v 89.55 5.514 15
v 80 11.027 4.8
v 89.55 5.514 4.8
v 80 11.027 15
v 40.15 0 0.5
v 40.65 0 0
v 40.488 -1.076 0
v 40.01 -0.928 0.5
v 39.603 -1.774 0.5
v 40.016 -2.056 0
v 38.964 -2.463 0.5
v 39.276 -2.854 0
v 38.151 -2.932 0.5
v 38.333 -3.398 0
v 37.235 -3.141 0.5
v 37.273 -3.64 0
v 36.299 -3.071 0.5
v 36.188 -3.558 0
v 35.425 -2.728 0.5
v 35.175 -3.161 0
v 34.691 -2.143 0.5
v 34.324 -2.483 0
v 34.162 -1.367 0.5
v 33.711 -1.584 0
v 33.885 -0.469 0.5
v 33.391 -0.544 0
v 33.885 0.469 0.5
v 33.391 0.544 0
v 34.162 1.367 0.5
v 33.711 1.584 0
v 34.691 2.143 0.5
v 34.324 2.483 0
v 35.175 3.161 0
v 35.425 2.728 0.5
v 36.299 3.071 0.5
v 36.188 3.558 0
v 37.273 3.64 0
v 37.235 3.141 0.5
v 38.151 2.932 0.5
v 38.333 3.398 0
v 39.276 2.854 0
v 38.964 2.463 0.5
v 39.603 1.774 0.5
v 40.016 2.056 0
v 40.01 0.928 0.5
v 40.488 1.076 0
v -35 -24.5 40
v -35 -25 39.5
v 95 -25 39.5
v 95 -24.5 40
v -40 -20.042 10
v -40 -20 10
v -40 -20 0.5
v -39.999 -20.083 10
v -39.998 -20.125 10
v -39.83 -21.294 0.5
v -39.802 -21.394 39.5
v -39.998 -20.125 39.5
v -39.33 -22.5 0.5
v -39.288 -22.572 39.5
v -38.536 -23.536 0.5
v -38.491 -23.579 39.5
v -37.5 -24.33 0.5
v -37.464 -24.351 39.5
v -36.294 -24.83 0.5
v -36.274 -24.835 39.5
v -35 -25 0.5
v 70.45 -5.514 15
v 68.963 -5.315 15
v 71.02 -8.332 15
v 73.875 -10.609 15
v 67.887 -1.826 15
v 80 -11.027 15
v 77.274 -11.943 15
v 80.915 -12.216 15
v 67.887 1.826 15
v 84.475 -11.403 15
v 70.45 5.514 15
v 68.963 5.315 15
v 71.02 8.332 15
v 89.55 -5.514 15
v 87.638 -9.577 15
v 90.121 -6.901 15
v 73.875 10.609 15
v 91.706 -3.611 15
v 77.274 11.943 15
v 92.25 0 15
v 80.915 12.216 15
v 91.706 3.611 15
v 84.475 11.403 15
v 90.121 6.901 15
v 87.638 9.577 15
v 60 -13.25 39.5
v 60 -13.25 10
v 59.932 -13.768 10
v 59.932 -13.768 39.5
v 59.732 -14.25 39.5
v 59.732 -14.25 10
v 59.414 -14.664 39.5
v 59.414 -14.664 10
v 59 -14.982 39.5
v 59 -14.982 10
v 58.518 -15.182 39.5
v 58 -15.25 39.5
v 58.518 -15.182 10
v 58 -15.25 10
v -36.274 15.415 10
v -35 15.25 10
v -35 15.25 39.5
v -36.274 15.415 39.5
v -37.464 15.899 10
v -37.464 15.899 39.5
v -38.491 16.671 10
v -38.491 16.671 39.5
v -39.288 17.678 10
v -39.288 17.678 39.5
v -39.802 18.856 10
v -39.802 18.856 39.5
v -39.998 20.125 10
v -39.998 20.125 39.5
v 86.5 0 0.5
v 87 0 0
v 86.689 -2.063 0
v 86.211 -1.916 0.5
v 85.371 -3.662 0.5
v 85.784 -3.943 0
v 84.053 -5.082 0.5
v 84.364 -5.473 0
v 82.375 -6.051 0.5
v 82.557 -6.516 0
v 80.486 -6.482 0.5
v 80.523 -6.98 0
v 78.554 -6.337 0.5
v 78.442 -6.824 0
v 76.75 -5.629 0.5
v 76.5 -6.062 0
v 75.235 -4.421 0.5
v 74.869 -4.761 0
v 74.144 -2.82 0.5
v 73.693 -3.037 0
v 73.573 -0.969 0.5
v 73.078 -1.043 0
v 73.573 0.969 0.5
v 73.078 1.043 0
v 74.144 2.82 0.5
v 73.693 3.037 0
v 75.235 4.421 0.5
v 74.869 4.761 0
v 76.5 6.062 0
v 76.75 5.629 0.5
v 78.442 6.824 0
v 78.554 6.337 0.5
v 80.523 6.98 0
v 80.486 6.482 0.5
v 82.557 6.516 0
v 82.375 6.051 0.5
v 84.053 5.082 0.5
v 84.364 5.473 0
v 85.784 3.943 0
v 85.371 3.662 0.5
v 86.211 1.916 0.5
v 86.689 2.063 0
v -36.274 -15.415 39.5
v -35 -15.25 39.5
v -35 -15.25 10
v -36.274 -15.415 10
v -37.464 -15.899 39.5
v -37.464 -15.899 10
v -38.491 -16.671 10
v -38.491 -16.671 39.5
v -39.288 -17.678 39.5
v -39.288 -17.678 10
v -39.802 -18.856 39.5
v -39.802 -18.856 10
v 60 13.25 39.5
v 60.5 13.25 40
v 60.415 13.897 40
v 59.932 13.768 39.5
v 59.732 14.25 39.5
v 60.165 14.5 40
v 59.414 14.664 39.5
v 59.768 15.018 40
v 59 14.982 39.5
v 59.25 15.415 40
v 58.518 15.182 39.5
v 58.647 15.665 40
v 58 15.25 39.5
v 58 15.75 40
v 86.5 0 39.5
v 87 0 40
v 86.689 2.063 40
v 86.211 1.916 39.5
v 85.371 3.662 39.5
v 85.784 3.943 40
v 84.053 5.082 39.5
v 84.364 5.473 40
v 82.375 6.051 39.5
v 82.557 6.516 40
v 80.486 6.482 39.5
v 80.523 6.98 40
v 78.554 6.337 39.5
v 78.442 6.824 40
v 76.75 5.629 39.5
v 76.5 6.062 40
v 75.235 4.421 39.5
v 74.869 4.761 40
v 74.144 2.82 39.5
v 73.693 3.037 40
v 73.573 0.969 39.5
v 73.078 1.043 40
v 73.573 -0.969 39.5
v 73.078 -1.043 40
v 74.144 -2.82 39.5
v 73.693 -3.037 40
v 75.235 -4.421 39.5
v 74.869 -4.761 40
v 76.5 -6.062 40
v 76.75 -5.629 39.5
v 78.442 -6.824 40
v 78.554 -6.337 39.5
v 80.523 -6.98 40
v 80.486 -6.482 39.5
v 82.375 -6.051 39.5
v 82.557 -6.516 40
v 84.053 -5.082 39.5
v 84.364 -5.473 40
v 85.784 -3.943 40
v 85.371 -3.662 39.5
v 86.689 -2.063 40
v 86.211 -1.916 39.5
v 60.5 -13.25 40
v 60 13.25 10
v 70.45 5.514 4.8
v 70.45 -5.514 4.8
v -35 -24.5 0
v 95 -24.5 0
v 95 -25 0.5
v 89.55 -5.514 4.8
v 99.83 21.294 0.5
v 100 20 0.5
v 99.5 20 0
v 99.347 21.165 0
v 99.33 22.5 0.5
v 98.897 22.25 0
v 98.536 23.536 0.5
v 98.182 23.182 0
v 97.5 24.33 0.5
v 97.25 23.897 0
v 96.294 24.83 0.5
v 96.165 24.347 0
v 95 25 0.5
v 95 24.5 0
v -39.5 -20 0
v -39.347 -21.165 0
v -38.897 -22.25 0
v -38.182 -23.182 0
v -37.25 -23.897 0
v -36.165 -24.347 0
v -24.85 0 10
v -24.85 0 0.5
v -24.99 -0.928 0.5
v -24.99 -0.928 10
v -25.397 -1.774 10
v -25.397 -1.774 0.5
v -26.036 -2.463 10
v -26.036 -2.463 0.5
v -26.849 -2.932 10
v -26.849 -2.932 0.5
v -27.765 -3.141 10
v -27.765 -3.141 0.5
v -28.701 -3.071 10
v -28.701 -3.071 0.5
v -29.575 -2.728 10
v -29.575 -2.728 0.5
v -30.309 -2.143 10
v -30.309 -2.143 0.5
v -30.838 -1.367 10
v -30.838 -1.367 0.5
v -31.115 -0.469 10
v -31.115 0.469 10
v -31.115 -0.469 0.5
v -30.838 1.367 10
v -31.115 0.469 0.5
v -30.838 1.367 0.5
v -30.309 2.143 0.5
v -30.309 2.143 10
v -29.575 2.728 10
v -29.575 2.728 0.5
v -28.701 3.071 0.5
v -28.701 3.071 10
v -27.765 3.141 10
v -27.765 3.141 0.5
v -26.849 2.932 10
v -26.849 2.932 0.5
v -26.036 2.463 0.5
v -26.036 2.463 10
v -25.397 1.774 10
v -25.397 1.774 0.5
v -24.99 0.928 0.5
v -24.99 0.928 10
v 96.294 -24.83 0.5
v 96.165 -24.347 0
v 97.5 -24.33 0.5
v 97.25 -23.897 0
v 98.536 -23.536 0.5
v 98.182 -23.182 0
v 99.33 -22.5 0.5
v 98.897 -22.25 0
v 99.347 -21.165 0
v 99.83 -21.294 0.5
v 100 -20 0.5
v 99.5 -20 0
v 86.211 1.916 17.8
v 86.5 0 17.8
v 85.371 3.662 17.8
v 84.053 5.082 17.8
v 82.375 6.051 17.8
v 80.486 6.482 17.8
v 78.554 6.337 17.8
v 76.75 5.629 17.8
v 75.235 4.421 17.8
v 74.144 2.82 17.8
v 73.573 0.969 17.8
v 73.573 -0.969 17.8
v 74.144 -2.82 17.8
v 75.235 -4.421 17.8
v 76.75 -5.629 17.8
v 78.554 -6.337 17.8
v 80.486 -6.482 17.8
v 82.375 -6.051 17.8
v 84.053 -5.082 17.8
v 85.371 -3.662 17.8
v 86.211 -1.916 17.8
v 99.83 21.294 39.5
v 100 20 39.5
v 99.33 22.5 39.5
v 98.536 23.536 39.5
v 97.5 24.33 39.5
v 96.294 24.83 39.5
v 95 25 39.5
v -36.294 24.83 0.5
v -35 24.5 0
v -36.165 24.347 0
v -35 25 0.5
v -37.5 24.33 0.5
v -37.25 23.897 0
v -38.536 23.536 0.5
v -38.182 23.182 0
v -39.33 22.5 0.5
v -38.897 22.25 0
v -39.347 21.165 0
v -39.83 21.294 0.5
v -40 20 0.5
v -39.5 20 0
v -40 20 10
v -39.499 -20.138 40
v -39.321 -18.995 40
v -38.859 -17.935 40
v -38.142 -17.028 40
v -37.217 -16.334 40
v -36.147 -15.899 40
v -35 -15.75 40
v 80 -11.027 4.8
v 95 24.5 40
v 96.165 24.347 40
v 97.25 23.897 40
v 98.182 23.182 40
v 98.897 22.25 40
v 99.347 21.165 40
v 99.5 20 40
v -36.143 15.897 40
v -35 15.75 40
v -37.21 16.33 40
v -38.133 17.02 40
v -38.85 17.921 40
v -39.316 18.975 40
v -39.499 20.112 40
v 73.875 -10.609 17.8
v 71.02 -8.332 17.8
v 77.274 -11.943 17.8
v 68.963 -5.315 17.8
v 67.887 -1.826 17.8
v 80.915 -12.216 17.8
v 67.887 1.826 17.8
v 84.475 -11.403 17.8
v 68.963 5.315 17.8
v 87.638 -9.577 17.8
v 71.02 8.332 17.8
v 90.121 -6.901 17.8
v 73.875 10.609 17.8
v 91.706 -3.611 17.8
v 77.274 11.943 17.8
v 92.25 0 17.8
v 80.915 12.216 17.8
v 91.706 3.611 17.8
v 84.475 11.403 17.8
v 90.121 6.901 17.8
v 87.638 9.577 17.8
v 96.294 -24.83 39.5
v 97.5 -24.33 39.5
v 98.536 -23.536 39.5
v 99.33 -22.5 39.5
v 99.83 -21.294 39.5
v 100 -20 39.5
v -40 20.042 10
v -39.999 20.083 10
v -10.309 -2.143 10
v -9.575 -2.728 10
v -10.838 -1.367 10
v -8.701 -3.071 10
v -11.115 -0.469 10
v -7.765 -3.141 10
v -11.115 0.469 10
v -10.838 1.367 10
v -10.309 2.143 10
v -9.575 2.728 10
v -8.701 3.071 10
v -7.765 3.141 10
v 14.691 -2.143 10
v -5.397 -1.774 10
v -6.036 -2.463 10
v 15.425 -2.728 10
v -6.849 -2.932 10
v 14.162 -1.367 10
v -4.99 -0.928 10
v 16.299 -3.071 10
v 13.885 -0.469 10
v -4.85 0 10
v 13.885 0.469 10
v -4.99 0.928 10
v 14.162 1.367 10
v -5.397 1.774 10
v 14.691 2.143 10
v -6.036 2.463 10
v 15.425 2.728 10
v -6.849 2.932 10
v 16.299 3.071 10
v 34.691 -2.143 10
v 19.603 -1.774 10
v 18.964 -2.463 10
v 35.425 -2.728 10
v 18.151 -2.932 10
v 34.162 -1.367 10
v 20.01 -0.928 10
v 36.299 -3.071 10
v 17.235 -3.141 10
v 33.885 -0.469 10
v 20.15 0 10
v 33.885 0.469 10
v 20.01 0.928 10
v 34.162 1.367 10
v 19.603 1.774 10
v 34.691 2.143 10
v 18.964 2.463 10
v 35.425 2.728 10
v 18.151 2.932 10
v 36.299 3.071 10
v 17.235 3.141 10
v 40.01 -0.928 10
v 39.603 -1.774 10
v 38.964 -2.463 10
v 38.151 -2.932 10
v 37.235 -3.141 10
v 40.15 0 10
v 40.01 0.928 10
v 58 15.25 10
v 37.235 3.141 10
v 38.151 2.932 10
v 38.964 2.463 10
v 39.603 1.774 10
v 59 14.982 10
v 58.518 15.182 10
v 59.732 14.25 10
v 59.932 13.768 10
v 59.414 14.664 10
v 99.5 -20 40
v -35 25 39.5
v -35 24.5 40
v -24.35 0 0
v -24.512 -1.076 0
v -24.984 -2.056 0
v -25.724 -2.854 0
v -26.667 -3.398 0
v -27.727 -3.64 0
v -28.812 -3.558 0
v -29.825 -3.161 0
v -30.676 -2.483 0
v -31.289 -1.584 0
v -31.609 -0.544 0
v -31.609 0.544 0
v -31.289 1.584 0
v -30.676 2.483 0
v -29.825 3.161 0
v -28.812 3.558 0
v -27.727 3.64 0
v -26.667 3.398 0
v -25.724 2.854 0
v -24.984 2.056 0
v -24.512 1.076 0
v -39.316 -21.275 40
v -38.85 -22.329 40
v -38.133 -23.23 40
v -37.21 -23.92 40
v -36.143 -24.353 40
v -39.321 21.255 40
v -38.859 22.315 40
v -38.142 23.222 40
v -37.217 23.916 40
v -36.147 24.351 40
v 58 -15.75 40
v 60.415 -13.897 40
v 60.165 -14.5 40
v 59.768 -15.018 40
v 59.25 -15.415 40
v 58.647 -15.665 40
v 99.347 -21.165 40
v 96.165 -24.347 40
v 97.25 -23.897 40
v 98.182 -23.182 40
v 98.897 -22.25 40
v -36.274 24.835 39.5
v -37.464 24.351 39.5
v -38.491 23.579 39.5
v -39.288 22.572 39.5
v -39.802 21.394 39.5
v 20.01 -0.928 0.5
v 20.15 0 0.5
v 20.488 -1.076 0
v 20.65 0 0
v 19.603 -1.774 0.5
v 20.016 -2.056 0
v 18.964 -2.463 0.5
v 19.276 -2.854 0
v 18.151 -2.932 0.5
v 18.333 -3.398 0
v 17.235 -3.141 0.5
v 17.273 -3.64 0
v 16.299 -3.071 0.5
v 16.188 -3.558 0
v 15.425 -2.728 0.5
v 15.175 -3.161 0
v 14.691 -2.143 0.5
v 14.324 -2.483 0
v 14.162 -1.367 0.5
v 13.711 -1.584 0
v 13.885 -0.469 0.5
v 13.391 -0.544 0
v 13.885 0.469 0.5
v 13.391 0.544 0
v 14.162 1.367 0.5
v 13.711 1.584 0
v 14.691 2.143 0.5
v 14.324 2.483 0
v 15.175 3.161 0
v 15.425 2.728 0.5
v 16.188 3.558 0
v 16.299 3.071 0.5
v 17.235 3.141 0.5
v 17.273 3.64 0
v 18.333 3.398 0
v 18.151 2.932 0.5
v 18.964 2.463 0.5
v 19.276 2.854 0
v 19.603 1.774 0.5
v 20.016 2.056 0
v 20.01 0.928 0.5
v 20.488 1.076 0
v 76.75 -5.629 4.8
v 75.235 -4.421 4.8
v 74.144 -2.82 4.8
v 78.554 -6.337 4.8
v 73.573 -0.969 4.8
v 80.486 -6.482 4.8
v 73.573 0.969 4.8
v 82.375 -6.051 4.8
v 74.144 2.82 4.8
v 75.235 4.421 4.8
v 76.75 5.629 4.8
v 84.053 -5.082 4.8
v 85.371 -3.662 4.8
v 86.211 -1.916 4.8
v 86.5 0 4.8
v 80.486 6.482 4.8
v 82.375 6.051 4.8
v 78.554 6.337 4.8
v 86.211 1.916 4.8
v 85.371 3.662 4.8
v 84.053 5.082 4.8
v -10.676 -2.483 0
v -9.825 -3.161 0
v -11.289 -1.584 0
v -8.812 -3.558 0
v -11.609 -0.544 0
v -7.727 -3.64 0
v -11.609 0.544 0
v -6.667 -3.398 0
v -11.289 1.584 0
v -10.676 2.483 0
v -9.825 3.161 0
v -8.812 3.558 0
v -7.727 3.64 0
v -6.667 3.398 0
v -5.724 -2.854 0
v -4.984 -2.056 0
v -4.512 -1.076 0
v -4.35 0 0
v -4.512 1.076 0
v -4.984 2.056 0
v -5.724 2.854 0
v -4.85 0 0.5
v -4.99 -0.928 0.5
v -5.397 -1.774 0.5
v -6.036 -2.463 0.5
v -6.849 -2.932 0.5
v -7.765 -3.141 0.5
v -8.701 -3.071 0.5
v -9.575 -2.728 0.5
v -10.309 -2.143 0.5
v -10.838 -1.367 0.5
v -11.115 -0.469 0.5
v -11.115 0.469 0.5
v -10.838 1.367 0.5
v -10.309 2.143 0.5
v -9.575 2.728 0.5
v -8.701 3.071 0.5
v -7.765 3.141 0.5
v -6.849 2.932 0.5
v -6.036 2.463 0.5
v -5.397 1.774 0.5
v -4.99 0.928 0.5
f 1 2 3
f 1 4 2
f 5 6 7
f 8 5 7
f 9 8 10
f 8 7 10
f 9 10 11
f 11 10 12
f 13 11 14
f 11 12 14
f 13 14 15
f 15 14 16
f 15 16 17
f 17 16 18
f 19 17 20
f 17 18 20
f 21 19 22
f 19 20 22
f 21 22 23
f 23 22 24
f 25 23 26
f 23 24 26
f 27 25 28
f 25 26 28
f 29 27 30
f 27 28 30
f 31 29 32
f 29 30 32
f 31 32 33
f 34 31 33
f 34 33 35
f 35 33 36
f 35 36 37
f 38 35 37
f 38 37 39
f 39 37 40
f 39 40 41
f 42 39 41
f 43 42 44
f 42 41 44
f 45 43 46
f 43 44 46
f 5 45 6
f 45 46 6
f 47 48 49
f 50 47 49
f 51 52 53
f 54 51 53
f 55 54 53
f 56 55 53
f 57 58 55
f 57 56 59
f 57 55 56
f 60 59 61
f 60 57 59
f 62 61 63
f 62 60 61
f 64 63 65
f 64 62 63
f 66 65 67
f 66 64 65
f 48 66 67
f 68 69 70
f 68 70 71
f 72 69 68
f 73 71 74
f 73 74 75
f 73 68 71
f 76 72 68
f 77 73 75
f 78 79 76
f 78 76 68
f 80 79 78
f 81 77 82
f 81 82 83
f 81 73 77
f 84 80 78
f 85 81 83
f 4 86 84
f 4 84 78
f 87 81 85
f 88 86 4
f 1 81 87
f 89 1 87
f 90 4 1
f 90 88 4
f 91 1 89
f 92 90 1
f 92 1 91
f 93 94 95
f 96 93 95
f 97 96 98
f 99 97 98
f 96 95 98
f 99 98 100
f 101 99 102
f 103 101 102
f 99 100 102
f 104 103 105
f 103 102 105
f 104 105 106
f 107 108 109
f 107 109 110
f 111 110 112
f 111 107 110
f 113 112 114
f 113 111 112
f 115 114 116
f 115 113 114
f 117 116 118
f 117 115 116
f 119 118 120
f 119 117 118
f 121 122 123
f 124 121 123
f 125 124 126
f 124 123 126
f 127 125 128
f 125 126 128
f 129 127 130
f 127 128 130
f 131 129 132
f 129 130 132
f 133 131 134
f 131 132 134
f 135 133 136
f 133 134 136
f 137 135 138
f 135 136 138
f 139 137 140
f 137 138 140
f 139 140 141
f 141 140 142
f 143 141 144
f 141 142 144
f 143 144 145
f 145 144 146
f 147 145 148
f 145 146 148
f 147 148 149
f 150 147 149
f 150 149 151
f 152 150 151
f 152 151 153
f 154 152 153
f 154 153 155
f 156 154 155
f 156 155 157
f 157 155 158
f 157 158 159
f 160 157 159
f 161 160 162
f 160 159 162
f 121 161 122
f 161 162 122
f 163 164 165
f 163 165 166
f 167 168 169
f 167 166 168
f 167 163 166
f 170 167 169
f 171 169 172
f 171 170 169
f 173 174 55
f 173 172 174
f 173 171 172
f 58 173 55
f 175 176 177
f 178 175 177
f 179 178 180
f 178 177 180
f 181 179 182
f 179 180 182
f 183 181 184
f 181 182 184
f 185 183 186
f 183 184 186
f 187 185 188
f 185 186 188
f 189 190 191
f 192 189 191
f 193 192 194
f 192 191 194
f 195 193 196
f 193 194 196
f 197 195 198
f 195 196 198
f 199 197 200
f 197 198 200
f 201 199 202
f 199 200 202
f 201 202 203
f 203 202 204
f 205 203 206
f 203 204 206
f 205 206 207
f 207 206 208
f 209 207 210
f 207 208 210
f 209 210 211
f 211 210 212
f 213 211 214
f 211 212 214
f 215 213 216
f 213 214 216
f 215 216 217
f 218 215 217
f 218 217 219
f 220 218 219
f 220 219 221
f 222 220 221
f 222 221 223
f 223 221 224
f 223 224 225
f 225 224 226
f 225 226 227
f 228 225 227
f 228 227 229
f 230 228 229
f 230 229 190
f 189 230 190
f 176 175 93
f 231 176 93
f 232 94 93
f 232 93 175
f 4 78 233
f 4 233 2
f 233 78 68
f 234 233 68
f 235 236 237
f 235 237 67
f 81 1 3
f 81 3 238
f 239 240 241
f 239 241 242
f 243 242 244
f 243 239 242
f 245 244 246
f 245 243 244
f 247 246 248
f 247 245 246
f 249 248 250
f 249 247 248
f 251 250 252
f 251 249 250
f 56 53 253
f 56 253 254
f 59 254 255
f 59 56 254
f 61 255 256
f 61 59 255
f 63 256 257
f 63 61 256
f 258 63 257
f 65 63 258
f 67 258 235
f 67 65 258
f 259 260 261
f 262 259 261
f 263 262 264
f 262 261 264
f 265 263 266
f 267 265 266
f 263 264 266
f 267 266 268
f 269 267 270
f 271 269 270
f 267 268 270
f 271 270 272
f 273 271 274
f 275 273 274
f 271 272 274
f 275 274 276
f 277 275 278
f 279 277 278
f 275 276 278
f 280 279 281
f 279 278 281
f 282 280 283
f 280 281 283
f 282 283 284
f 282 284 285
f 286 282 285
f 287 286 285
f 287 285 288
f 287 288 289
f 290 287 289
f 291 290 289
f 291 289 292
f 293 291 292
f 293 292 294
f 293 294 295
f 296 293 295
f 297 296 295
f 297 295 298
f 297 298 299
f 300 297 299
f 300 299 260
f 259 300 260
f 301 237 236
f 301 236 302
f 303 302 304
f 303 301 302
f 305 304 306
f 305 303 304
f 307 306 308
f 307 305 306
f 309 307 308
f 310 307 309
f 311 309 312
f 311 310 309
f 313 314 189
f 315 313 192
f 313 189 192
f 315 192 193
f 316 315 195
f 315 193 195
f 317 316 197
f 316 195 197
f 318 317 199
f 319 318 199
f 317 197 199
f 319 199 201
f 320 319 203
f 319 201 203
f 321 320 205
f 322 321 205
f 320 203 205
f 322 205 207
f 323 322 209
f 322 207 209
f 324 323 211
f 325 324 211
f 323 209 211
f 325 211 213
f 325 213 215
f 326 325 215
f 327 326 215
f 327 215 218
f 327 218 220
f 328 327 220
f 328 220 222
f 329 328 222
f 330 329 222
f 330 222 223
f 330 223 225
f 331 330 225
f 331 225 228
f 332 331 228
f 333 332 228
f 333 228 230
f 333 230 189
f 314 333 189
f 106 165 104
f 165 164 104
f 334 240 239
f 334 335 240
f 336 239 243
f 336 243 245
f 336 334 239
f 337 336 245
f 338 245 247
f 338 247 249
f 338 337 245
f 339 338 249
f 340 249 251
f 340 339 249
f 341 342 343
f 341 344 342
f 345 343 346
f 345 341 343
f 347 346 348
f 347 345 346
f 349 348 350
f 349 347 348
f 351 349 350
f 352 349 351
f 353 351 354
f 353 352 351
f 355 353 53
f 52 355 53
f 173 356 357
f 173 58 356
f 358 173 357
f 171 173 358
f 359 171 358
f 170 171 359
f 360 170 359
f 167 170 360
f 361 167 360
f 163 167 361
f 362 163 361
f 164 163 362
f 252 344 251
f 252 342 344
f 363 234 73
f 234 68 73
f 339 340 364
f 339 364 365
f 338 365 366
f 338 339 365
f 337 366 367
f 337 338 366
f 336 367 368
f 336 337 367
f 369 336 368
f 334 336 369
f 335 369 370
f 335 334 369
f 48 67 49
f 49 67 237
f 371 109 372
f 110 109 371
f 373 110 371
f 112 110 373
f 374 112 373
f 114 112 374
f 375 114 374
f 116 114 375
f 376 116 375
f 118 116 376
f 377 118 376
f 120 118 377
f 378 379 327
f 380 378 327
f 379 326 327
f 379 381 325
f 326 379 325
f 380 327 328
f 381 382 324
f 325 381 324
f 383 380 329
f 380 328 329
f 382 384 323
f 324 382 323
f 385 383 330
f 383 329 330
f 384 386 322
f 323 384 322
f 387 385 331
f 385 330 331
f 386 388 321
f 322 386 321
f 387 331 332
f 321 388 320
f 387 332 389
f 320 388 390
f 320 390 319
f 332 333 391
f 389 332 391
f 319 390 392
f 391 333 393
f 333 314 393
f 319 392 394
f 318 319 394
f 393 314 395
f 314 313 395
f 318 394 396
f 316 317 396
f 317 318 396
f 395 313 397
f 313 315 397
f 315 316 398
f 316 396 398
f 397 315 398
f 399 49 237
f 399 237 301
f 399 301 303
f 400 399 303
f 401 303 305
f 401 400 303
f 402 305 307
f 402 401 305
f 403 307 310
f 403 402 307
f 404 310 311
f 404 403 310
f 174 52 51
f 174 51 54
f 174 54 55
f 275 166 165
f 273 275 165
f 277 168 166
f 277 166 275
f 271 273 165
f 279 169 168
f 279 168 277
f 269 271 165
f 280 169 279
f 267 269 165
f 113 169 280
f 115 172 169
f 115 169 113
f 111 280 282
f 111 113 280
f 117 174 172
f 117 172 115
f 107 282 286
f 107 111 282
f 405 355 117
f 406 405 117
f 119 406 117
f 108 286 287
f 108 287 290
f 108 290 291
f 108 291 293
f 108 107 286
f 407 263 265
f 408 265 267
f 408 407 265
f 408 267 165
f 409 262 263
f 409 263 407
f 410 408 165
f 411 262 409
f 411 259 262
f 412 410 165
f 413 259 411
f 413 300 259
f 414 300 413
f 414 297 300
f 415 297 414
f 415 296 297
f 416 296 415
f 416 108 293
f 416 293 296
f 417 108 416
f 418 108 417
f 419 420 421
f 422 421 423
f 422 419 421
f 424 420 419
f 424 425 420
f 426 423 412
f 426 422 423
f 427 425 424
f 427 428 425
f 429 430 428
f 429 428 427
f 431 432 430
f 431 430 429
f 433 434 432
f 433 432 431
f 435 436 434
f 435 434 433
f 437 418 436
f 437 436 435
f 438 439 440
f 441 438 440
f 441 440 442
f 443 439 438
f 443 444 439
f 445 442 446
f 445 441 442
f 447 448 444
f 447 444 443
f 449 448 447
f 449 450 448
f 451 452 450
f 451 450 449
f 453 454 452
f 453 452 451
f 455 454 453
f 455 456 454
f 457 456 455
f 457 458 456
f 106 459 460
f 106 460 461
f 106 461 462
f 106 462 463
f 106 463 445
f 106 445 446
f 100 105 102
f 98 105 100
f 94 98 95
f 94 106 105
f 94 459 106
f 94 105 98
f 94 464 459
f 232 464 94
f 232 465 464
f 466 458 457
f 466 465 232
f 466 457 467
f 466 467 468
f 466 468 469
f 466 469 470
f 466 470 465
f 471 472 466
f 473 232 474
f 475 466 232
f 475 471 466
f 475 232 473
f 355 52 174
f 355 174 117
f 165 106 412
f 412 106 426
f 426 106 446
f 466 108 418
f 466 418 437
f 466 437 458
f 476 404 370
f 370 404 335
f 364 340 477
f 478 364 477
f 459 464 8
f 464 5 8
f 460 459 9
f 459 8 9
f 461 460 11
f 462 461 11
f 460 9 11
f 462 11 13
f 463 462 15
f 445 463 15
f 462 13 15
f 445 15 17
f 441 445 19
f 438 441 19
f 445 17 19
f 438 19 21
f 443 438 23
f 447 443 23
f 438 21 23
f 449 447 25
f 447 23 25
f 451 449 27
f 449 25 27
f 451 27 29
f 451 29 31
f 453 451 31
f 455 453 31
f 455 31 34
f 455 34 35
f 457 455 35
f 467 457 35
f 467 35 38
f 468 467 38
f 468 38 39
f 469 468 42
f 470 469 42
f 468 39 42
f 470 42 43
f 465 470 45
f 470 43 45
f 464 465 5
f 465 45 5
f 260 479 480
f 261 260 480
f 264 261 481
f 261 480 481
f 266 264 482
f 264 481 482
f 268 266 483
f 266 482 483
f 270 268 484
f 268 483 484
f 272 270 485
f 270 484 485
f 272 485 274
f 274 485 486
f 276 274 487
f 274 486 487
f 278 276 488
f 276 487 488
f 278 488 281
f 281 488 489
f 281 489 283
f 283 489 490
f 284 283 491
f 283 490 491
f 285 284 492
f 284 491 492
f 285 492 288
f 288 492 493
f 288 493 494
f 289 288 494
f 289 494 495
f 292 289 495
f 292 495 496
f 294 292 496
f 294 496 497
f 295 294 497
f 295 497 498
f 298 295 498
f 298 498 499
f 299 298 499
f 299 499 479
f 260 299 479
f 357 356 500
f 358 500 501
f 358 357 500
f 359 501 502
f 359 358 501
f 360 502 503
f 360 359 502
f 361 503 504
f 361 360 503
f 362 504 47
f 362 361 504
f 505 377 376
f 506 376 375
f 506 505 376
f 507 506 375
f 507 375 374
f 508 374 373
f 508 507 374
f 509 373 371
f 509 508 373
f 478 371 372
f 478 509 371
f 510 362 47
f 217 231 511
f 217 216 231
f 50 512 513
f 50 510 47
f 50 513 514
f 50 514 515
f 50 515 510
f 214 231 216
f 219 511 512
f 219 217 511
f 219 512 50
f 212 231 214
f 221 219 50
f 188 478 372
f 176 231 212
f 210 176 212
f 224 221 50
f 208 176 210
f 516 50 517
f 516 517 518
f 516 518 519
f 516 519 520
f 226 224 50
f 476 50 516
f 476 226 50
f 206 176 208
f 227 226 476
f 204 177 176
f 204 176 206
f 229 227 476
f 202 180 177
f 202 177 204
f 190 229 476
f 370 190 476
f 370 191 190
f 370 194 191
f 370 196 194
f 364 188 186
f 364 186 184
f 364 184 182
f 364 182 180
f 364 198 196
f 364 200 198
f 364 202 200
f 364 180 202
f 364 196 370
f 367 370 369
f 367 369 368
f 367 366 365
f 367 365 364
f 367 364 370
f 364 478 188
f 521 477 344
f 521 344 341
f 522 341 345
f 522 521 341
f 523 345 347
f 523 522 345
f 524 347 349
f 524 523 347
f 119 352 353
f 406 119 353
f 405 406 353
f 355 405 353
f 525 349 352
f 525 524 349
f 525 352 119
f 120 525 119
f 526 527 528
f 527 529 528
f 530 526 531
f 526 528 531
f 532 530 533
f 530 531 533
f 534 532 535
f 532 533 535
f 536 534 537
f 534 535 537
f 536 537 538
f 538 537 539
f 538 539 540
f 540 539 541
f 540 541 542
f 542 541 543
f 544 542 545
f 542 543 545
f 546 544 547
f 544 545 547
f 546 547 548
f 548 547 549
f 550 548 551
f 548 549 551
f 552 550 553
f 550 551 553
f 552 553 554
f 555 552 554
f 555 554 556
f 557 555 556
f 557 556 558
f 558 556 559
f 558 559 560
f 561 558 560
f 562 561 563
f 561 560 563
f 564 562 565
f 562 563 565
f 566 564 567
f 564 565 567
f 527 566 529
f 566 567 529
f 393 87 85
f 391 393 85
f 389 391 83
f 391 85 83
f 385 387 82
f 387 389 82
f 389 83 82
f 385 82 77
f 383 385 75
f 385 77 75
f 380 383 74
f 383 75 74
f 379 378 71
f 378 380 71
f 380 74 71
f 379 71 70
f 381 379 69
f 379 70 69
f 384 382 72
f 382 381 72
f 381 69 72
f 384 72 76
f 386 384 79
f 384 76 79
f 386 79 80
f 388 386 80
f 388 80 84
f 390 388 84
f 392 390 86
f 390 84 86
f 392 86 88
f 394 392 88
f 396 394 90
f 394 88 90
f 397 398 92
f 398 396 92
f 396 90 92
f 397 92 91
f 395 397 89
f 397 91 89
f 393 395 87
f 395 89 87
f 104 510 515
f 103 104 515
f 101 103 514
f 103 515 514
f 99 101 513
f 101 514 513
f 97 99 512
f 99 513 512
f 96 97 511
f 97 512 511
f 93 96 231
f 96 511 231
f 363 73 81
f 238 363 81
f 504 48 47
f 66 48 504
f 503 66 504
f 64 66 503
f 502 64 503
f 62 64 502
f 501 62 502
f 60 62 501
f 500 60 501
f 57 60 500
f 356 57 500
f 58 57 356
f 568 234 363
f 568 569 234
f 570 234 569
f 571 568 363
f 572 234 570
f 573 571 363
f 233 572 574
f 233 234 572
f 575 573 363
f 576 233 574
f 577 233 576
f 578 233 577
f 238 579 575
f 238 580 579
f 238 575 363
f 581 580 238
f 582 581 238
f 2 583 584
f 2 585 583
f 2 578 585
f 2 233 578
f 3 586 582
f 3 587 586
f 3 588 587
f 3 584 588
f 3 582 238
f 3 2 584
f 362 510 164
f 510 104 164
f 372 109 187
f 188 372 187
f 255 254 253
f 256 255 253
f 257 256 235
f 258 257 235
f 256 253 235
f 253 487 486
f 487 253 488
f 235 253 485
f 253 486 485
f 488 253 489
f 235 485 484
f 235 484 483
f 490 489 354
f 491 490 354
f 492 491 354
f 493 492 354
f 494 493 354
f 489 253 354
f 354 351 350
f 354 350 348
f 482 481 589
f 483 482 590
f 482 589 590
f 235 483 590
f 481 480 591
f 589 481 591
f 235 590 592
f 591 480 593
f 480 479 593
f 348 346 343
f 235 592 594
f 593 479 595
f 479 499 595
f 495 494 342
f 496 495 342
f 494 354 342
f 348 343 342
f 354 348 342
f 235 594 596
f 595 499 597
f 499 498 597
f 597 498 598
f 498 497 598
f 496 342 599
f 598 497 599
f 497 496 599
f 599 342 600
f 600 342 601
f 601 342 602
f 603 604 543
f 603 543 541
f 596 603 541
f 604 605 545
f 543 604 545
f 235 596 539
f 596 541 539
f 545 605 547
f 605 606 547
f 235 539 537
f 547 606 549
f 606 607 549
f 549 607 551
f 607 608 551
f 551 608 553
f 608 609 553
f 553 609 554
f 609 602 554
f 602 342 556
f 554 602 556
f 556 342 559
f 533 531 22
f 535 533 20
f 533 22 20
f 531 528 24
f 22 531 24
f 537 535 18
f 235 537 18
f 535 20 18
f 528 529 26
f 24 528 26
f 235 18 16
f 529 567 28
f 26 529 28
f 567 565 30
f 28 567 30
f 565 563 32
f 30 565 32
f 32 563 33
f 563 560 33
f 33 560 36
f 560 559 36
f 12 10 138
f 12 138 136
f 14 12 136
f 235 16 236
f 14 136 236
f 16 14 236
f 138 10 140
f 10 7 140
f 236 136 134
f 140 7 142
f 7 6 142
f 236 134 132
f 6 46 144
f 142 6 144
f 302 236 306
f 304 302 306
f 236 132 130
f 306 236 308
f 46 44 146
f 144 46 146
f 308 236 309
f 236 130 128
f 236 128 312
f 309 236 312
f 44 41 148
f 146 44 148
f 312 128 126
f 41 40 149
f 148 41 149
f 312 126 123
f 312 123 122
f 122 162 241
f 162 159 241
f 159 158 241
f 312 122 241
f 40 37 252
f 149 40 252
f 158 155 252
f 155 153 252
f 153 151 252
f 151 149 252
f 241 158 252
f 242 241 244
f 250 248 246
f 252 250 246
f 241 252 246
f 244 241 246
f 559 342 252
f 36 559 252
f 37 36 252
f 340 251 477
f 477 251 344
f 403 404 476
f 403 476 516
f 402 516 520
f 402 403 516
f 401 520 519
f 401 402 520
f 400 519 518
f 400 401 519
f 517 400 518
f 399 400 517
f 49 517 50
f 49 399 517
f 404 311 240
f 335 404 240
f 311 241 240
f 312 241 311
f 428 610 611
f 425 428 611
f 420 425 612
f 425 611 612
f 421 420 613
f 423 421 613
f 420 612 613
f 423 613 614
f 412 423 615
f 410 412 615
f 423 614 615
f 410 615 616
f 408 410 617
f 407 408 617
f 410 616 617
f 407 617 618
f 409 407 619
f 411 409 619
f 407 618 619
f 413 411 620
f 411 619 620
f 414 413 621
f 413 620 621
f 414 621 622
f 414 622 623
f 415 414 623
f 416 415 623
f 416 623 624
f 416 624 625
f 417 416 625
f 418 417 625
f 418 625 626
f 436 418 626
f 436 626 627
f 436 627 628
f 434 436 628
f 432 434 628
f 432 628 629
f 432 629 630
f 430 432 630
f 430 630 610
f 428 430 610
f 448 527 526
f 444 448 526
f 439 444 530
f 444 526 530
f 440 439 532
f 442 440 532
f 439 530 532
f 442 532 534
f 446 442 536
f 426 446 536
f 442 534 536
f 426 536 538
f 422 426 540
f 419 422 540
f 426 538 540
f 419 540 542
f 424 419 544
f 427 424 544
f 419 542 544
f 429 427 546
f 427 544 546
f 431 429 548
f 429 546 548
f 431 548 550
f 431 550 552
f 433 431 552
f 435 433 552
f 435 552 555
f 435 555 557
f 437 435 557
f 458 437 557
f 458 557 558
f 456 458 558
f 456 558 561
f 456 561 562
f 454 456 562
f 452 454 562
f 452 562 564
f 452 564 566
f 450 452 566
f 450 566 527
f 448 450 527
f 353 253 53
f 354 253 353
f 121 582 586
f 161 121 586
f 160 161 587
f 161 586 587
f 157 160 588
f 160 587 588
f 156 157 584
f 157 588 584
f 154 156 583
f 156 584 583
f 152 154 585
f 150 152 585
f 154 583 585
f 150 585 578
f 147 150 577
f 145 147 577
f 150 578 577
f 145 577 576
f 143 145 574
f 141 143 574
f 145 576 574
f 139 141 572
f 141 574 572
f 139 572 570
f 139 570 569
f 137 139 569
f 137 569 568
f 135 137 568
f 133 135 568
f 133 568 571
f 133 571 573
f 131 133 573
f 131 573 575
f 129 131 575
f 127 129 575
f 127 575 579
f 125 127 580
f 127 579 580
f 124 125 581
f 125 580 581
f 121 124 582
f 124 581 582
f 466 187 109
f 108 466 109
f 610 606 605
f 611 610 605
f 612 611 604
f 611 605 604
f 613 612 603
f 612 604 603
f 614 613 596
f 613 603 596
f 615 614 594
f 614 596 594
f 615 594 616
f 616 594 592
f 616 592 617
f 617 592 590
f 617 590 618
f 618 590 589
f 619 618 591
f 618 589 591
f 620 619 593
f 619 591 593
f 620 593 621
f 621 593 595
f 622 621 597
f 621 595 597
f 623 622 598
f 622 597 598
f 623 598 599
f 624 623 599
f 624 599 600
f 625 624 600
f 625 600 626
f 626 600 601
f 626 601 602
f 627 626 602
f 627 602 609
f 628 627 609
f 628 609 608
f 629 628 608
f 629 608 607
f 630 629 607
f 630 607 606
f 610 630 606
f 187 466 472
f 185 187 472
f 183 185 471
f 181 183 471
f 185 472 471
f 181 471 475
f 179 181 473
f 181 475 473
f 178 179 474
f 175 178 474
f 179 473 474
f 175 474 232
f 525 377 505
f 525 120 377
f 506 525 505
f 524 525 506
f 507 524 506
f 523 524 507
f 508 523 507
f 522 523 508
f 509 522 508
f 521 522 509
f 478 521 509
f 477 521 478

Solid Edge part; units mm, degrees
sketch "Sketch1" plane through (0, 0, 0) normal (0, 0, 1) x (1, 0, 0)
  line L0 (100, -25) -> (100, 25)
  line L1 (100, 25) -> (-40, 25)
  line L2 (-40, 25) -> (-40, -25)
  line L3 (-40, -25) -> (100, -25)
extrude "Extrusionsausprägung_20" add sketch "Sketch1" along normal blind 40
sketch "Sketch2" plane through (30, 0, 40) normal (0, 0, 1) x (1, 0, 0)
  line L0 (-70, -15.25) -> (30, -15.25)
  line L1 (30, -15.25) -> (30, 15.25)
  line L2 (30, 15.25) -> (-70, 15.25)
  line L3 (-70, 15.25) -> (-70, -15.25)
extrude "Extrusionsausschnitt_24" cut sketch "Sketch2" against normal blind 30
sketch "Sketch3" plane through (30, 0, 40) normal (0, 0, 1) x (1, 0, 0)
  circle A0 centre (50, 0) radius 6.5
extrude "Extrusionsausschnitt_25" cut sketch "Sketch3" against normal blind 78
sketch "Sketch4" plane through (0, 0, 15) normal (0, 0, 1) x (1, 0, 0)
  circle A0 centre (80, 0) radius 12.25
extrude "Extrusionsausschnitt_26" cut sketch "Sketch4" along normal blind 2.8
sketch "Sketch5" plane through (0, 0, 15) normal (0, 0, 1) x (1, 0, 0)
  line L0 (70.45, -5.5137) -> (80, -11.0274)
  line L1 (80, -11.0274) -> (89.55, -5.5137)
  line L2 (89.55, 5.5137) -> (89.55, -5.5137)
  line L3 (80, 11.0274) -> (89.55, 5.5137)
  line L4 (70.45, 5.5137) -> (80, 11.0274)
  line L5 (70.45, 5.5137) -> (70.45, -5.5137)
extrude "Extrusionsausschnitt_28" cut sketch "Sketch5" against normal blind 10.2
fillet "Verrundung_15" radius 5 6 edges at (100, -25, 20) (100, 25, 20) (-40, -25, 20) (-40, -15.25, 25) (-40, 15.25, 25) (-40, 25, 20)
fillet "Verrundung_16" radius 2 2 edges at (60, 15.25, 25) (60, -15.25, 25)
sketch "Sketch6" plane through (30, 0, 0) normal (0, 0, -1) x (1, 0, 0)
  circle A0 centre (-58, 0) radius 3.15
  circle A1 centre (-38, 0) radius 3.15
  circle A2 centre (-13, 0) radius 3.15
  circle A3 centre (7, 0) radius 3.15
extrude "Extrusionsausschnitt_29" cut sketch "Sketch6" against normal blind 70
chamfer "Fase_9" distance 0.5 angle 45 15 edges at (73.5, 0, 40) (30, 25, 40) (-38.4911, 23.5795, 40) (-38.4911, 16.6705, 40) (11.5, 15.25, 40) (59.4142, 14.6642, 40) (60, 0, 40) (59.4142, -14.6642, 40) (11.5, -15.25, 40) (-38.4911, -16.6705, 40) (-38.4911, -23.5795, 40) (30, -25, 40) (98.5355, -23.5355, 40) (100, 0, 40) (98.5355, 23.5355, 40)
chamfer "Fase_10" distance 0.5 angle 45 13 edges at (-31.15, 0, 0) (-11.15, 0, 0) (13.85, 0, 0) (33.85, 0, 0) (73.5, 0, 0) (-40, 0, 0) (-38.5355, 23.5355, 0) (30, 25, 0) (98.5355, 23.5355, 0) (100, 0, 0) (98.5355, -23.5355, 0) (30, -25, 0) (-38.5355, -23.5355, 0)
